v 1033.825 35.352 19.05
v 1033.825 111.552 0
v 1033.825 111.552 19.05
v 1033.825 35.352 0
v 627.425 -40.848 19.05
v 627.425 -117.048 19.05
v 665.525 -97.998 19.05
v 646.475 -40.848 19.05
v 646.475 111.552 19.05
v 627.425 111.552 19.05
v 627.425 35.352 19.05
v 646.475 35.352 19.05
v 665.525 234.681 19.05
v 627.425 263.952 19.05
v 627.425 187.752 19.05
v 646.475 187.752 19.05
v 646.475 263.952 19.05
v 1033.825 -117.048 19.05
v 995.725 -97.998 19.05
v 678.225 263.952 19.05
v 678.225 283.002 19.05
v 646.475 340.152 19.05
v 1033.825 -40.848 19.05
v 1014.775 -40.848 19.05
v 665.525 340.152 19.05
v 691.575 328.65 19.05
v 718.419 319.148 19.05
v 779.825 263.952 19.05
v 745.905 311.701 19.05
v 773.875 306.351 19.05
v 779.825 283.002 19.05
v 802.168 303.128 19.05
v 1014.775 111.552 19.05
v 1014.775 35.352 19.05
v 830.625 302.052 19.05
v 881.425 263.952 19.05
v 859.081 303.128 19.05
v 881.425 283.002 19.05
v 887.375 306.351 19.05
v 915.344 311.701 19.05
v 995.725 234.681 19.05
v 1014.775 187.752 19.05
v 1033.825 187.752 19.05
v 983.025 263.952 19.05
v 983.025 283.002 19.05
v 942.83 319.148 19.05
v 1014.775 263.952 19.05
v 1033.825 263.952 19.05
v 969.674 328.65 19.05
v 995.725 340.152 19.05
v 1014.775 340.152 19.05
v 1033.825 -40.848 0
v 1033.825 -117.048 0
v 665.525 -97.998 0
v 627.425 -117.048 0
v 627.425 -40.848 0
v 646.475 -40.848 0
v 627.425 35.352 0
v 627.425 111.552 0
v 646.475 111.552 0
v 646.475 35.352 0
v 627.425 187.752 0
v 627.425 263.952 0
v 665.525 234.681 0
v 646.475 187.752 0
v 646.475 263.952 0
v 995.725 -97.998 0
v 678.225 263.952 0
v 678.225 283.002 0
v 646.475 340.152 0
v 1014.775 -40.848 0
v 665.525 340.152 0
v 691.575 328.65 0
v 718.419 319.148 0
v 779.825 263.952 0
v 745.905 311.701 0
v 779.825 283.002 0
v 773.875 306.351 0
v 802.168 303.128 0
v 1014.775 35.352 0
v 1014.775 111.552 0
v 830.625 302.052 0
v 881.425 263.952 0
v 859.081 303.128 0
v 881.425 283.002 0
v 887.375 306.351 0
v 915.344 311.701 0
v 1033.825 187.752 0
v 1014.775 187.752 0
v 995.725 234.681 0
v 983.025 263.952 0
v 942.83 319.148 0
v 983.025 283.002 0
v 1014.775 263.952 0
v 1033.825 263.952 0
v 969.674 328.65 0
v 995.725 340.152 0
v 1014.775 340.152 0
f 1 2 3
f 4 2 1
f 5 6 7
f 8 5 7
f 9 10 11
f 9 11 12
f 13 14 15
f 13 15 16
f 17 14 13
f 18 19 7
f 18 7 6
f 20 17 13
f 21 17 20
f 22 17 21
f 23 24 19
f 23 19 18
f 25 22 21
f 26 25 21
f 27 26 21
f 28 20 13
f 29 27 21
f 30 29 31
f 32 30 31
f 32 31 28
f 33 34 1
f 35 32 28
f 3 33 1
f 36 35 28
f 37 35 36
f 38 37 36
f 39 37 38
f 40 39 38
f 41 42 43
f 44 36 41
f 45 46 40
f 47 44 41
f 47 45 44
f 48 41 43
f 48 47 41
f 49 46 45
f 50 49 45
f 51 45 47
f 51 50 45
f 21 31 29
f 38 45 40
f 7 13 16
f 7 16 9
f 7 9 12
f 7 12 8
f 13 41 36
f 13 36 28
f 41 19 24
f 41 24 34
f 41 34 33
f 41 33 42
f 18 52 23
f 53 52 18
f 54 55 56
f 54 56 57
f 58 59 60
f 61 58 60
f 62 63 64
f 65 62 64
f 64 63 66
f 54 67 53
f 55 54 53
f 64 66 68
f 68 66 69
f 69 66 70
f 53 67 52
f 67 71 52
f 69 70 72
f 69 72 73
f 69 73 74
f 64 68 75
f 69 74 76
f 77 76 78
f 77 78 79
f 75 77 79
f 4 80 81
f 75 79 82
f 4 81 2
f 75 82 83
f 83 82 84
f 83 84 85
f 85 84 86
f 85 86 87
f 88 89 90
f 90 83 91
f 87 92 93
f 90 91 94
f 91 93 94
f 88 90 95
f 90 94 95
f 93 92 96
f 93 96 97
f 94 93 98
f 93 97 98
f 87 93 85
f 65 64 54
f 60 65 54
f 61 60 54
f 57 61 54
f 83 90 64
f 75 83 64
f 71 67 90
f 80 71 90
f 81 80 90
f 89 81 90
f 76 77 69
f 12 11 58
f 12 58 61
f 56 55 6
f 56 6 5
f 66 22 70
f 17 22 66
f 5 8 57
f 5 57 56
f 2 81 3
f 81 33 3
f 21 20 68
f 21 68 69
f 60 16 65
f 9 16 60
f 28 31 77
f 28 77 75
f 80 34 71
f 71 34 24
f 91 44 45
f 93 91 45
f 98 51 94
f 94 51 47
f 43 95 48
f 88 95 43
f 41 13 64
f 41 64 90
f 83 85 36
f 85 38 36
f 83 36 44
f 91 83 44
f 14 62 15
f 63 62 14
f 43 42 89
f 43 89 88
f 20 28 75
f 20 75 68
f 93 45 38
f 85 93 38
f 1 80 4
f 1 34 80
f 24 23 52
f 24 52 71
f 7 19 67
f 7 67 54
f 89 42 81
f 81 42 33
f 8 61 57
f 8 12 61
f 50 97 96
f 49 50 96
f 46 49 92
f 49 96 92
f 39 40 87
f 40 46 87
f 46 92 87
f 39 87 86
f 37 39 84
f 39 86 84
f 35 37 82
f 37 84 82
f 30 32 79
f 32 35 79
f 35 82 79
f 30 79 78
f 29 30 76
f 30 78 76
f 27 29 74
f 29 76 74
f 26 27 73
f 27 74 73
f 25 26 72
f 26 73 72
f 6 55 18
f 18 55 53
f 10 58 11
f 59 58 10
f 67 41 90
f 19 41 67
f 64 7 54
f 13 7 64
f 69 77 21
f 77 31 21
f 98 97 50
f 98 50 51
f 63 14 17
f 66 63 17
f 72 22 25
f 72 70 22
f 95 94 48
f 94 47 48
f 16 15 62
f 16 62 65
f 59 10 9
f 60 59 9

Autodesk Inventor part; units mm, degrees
ref_plane "YZ Plane" through (0, 0, 0) normal (1, 0, 0) x (0, 1, 0)
ref_plane "XZ Plane" through (0, 0, 0) normal (0, 1, 0) x (-1, 0, 0)
ref_plane "XY Plane" through (0, 0, 0) normal (0, 0, 1) x (1, 0, 0)
sketch "Sketch1" plane through (0, 0, 0) normal (0, 0, 1) x (1, 0, 0)
  line L0 (1033.8246, 340.1521) -> (1033.8246, -117.0479)
  line L1 (627.4246, -117.0479) -> (627.4246, 340.1521)
  line L2 (627.4246, -117.0479) -> (1033.8246, -117.0479)
  arc A0 (665.5246, 340.1521) -> (995.7246, 340.1521) centre (830.6246, 678.8187) ccw
  line L3 (627.4246, 340.1521) -> (665.5246, 340.1521)
  line L4 (995.7246, 340.1521) -> (1033.8246, 340.1521)
  point P0 (0, 0)
  dimension "d0" = 406.4
  dimension "d1" = 457.2
extrude "Extrusion1" add sketch "Sketch1" along normal blind 19.05
sketch "Sketch2" plane through (0, 0, 19.05) normal (0, 0, 1) x (1, 0, 0)
  line L0 (1033.8246, 340.1521) -> (627.4246, 340.1521) projected
  line L1 (627.4246, -117.0479) -> (-960.0754, -117.0479) projected
  line L2 (627.4246, 340.1521) -> (646.4746, 340.1521)
  line L3 (646.4746, 340.1521) -> (646.4746, -117.0479)
  line L4 (646.4746, -117.0479) -> (627.4246, -117.0479)
  line L5 (627.4246, -117.0479) -> (627.4246, 340.1521)
  line L6 (1033.8246, -117.0479) -> (1033.8246, 340.1521) projected
  line L7 (1033.8246, 340.1521) -> (1014.7746, 340.1521)
  line L8 (1014.7746, 340.1521) -> (1014.7746, -117.0479)
  line L9 (1014.7746, -117.0479) -> (1033.8246, -117.0479)
  line L10 (1033.8246, -117.0479) -> (1033.8246, 340.1521)
  line L11 (627.4246, 340.1521) -> (627.4246, -117.0479) projected
  line L12 (627.4246, 263.9521) -> (646.4746, 263.9521)
  line L13 (1014.7746, 263.9521) -> (1033.8246, 263.9521)
  line L14 (627.4246, 187.7521) -> (646.4746, 187.7521)
  line L15 (1014.7746, 187.7521) -> (1033.8246, 187.7521)
  line L16 (627.4246, 111.5521) -> (646.4746, 111.5521)
  line L17 (1014.7746, 111.5521) -> (1033.8246, 111.5521)
  line L18 (627.4246, 35.3521) -> (646.4746, 35.3521)
  line L19 (1014.7746, 35.3521) -> (1033.8246, 35.3521)
  line L20 (1033.8246, -40.8479) -> (1014.7746, -40.8479)
  line L21 (646.4746, -40.8479) -> (627.4246, -40.8479)
  point P0 (0, 0)
  dimension "d7" = 19.05
  dimension "d8" = 19.05
extrude "Extrusion2" cut sketch "Sketch2" against normal blind 19.05 contours L6 L13 L8 L0 | L3 L12 L5 L0 | L6 L17 L8 L15 | L3 L16 L5 L14 | L6 L20 L8 L19 | L3 L21 L5 L18
sketch "Sketch3" plane through (0, 0, 19.05) normal (0, 0, 1) x (1, 0, 0)
  line L0 (1131.5205, 302.0521) -> (511.2286, 302.0521)
  line L1 (1014.7746, 340.1521) -> (995.7246, 340.1521) projected
  line L2 (1127.4261, 283.0021) -> (305.147, 283.0021)
  line L3 (830.6246, 74.0239) -> (830.6246, 388.6053)
  line L4 (1033.8246, 187.7521) -> (1033.8246, 263.9521) projected
  line L5 (983.0246, 283.0021) -> (881.4246, 283.0021)
  line L6 (881.4246, 283.0021) -> (881.4246, 263.9521)
  line L7 (881.4246, 263.9521) -> (983.0246, 263.9521)
  line L8 (983.0246, 263.9521) -> (983.0246, 283.0021)
  line L9 (1014.7746, 263.9521) -> (1014.7746, 340.1521) projected
  line L10 (678.2246, 283.0021) -> (779.8246, 283.0021)
  line L11 (779.8246, 283.0021) -> (779.8246, 263.9521)
  line L12 (779.8246, 263.9521) -> (678.2246, 263.9521)
  line L13 (678.2246, 263.9521) -> (678.2246, 283.0021)
  line L14 (646.4746, 340.1521) -> (646.4746, 263.9521) projected
  point P0 (0, 0)
  dimension "d24" = 38.1
  dimension "d25" = 19.05
  dimension "d26" = 203.2
  dimension "d27" = 31.75
  dimension "d28" = 101.6
  dimension "d29" = 19.05
  dimension "d30" = 31.75
  dimension "d31" = 101.6
  dimension "d32" = 19.05
extrude "Extrusion3" cut sketch "Sketch3" against normal blind 25.4 contours L8 L7 L6 L2 | L11 L12 L13 L2
sketch "Sketch5" plane through (0, 0, 19.05) normal (0, 0, 1) x (1, 0, 0)
  line L0 (665.5246, 234.6812) -> (995.7246, 234.6812)
  line L1 (995.7246, 234.6812) -> (995.7246, -97.9979)
  line L2 (995.7246, -97.9979) -> (665.5246, -97.9979)
  line L3 (665.5246, -97.9979) -> (665.5246, 234.6812)
  line L4 (1033.8246, 187.7521) -> (1033.8246, 263.9521) projected
  line L5 (627.4246, -117.0479) -> (1033.8246, -117.0479) projected
  line L6 (627.4246, 111.5521) -> (627.4246, 35.3521) projected
  point P0 (0, 0)
  dimension "d35" = 38.1
  dimension "d36" = 19.05
  dimension "d37" = 38.1
extrude "Extrusion4" cut sketch "Sketch5" against normal blind 25.4
properties part number "left side" material "Wood (Birch)"
